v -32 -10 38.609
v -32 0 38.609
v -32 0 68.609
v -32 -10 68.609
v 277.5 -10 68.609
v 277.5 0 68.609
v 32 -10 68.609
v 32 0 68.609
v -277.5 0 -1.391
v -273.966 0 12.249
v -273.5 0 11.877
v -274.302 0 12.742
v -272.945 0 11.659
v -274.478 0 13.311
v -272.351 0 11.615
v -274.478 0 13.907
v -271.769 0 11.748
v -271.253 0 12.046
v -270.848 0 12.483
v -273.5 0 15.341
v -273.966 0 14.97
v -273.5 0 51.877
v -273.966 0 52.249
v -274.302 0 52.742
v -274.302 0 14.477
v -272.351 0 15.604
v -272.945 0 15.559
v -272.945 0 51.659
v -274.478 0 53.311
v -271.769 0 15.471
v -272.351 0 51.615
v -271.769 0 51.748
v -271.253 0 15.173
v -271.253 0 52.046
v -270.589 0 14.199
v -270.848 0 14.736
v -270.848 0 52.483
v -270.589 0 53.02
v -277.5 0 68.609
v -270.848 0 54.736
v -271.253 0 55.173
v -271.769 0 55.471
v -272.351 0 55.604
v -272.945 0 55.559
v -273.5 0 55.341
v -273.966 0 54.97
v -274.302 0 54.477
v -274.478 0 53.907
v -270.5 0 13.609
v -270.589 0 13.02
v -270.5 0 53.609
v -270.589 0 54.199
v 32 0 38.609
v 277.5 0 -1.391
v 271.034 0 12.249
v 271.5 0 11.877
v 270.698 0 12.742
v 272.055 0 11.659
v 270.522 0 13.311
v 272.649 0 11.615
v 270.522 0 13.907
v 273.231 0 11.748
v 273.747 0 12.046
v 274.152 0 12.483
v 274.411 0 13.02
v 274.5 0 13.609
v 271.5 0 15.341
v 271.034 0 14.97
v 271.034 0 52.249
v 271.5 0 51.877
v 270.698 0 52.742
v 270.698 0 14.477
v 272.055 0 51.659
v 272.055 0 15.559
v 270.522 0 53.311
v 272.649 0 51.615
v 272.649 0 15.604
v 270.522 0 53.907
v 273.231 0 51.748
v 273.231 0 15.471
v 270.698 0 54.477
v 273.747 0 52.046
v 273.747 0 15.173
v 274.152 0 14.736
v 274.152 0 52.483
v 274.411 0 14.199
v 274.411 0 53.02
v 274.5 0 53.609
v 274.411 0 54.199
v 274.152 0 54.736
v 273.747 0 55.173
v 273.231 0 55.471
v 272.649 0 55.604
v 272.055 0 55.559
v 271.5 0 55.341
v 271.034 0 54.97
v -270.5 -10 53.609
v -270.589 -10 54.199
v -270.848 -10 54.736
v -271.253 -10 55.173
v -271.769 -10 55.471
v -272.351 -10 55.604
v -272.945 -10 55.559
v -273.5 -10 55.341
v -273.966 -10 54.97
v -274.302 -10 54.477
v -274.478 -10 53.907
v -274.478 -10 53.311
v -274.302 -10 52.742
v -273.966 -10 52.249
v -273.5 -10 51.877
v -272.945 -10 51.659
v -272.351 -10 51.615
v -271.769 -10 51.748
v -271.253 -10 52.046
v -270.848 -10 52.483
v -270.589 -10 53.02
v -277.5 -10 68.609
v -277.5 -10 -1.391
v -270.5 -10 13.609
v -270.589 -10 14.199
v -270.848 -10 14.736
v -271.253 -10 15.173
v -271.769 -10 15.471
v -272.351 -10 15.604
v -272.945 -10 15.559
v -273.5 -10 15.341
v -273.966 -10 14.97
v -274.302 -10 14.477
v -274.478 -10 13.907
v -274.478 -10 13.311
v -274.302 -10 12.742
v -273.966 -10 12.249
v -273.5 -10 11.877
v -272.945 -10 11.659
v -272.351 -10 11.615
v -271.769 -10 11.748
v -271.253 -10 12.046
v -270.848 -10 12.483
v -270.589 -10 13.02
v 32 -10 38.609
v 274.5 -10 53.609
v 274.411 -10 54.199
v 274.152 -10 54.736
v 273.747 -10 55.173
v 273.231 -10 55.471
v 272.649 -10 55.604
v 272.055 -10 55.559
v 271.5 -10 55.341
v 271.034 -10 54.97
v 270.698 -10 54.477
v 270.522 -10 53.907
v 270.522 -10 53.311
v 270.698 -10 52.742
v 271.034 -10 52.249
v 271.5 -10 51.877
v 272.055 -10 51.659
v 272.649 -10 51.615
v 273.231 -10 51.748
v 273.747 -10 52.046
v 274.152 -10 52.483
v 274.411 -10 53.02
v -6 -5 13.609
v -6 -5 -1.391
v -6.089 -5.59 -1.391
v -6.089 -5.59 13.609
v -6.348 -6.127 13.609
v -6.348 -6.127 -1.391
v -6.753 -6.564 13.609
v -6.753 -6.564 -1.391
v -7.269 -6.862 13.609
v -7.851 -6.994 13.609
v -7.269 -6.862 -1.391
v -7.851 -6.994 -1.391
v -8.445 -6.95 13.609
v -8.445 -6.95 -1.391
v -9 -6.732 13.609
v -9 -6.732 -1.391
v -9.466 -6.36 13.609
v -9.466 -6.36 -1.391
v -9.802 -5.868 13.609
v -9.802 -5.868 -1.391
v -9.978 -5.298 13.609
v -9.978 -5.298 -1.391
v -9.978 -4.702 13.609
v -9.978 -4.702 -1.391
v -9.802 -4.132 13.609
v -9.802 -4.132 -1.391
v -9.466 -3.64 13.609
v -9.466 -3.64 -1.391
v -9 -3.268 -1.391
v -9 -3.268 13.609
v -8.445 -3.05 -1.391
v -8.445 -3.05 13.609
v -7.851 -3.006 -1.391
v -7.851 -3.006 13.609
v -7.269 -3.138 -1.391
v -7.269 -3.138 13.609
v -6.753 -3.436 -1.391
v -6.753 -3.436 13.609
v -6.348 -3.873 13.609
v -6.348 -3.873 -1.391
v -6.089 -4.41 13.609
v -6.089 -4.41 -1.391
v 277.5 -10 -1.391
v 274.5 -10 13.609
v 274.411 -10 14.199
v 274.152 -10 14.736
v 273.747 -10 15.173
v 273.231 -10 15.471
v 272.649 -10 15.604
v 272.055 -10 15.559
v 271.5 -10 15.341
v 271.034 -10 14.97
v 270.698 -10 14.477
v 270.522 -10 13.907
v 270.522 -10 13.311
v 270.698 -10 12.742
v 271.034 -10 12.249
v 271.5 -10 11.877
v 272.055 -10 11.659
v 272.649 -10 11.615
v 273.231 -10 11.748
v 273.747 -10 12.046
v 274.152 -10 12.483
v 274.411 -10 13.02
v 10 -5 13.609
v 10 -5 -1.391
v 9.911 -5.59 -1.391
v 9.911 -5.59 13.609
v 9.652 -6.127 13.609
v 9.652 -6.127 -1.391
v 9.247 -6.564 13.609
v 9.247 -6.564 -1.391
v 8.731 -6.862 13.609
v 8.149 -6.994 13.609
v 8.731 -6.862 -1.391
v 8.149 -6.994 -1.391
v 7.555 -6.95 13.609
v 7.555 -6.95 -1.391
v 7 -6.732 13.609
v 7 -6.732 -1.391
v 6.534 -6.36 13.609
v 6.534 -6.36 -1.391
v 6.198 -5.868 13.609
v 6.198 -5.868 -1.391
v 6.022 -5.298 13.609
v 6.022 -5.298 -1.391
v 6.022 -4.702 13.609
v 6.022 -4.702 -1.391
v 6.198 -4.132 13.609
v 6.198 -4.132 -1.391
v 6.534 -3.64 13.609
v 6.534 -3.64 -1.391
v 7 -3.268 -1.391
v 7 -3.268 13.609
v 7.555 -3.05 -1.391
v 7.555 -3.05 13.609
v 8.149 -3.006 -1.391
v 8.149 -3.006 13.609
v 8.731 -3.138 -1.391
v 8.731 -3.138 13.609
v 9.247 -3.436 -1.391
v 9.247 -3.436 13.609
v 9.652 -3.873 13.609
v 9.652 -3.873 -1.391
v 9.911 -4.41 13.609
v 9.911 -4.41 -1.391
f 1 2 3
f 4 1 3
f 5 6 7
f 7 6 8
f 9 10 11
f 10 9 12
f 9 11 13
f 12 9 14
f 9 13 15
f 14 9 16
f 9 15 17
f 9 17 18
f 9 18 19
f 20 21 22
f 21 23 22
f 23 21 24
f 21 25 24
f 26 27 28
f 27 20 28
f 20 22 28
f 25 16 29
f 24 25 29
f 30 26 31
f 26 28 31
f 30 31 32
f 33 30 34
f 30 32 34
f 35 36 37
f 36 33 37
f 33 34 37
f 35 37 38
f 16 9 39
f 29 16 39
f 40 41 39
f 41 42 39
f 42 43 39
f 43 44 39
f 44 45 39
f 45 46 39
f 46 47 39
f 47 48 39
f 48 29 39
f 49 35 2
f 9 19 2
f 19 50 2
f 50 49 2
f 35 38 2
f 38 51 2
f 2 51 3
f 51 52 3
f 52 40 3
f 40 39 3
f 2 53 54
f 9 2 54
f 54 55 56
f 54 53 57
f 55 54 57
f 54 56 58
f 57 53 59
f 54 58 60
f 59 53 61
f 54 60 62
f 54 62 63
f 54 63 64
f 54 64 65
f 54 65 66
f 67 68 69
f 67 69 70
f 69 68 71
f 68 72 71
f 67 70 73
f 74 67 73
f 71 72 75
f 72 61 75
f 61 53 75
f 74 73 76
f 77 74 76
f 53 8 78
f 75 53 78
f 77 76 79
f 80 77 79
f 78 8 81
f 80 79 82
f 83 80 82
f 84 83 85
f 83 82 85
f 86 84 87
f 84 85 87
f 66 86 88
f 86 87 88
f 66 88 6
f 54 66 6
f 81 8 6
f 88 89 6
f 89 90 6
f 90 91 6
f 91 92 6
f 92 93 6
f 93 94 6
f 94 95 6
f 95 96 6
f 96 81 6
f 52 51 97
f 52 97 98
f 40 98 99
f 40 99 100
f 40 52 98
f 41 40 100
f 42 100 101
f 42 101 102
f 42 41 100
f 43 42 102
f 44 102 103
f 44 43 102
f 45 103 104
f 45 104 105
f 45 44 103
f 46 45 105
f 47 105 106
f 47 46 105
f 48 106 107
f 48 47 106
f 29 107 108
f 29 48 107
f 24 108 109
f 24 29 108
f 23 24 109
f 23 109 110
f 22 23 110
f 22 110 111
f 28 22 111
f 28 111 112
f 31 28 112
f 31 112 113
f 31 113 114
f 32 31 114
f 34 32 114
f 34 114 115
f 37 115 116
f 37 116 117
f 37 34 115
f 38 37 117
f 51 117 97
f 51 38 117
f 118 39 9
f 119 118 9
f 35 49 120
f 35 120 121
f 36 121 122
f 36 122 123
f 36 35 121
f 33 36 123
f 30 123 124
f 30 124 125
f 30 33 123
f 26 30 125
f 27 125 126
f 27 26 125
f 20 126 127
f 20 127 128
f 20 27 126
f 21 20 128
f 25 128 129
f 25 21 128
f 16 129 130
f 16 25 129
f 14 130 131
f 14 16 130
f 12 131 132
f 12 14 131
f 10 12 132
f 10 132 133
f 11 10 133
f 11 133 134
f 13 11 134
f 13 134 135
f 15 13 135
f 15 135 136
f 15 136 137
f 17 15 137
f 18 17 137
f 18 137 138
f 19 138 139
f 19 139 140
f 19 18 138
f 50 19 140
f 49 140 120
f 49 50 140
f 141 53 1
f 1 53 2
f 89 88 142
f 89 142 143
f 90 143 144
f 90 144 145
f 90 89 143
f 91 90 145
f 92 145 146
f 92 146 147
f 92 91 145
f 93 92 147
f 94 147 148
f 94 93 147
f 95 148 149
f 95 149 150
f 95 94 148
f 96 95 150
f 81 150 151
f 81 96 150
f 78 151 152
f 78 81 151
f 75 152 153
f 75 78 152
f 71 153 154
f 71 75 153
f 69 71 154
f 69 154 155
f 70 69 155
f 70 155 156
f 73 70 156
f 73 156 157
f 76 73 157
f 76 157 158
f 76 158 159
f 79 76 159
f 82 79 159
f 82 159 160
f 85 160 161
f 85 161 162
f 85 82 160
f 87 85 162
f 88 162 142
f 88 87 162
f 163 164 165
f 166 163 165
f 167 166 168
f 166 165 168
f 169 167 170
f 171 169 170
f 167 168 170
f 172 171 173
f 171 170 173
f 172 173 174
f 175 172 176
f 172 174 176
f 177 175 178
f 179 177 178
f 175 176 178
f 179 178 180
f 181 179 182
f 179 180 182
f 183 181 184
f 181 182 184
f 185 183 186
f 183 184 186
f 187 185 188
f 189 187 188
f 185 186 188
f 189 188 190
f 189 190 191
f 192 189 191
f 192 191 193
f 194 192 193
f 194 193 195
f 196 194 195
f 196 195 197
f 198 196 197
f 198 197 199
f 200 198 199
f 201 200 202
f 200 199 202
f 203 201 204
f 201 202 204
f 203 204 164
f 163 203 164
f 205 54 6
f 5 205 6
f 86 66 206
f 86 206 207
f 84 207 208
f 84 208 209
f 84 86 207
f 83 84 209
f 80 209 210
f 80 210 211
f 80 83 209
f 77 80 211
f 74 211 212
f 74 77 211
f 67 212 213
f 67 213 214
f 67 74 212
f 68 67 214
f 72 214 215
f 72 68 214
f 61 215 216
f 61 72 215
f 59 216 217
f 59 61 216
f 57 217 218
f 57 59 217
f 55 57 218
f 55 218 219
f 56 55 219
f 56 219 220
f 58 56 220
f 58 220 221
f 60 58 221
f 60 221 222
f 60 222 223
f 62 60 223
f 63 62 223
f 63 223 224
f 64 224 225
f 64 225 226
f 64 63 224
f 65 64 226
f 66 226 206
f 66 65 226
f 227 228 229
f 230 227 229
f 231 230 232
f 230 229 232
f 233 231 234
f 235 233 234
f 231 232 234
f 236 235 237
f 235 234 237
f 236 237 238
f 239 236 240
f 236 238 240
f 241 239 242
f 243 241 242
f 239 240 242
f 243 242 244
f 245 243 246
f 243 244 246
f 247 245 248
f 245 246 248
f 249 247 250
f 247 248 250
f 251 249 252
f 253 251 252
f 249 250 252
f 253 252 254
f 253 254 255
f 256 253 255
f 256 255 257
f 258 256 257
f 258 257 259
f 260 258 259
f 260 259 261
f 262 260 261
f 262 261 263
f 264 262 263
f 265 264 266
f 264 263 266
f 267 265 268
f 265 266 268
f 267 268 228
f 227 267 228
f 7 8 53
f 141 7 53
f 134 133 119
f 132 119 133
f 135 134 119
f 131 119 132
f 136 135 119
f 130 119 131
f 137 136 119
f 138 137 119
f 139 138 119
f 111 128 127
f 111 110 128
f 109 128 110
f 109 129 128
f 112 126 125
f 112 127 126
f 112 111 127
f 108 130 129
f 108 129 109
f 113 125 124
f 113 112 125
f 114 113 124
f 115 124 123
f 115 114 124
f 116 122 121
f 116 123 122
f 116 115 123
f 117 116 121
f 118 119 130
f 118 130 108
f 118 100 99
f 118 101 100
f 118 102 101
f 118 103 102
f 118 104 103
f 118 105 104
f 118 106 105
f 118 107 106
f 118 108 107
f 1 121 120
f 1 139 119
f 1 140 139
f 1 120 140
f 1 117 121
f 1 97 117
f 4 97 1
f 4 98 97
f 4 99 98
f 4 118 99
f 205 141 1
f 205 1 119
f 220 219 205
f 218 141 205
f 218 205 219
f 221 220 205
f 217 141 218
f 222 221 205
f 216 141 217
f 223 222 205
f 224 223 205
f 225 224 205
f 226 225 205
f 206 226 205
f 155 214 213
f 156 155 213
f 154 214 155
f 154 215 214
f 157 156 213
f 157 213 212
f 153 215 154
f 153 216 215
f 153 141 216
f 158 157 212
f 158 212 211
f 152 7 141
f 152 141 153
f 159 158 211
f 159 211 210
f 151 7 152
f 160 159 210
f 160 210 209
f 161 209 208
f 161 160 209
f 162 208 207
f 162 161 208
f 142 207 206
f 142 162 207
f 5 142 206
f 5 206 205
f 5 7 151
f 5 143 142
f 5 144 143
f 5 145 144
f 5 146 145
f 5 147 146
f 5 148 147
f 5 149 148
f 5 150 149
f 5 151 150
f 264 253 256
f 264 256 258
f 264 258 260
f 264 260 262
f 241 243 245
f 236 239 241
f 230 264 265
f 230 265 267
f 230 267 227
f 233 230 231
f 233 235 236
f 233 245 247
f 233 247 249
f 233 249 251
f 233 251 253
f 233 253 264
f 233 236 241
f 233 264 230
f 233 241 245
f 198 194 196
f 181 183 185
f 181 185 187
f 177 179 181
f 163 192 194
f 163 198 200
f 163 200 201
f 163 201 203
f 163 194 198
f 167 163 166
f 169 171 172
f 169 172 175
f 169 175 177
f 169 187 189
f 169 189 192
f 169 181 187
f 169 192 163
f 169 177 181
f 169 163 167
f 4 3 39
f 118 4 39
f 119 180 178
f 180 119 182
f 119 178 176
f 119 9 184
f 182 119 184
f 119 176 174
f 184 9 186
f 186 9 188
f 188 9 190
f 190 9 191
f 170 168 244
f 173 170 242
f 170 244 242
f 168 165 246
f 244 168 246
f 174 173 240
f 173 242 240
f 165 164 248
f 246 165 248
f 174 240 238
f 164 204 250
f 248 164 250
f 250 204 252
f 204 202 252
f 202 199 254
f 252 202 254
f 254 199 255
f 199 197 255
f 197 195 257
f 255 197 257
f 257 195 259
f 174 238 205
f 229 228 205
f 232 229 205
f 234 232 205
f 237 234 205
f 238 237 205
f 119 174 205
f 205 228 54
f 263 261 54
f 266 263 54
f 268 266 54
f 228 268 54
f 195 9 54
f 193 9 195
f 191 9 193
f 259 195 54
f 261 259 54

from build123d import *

# Parameters (mm, degrees)
F0_R     = 2
F1_DEPTH = 10
F2_R     = 2
F3_DEPTH = 15


with BuildPart() as f1:
    # F0 (on Front) → F1 (new body)
    with BuildSketch(Plane.XZ):
        Polygon((-32, 68.609319), (-277.5, 68.609319), (-277.5, -1.390681), (277.5, -1.390681), (277.5, 68.609319), (32, 68.609319), (32, 38.609319), (0, 38.609319), (-32, 38.609319), align=None)
        with Locations((-272.5, 13.609319)):
            Circle(F0_R, mode=Mode.SUBTRACT)
        with Locations((272.5, 13.609319)):
            Circle(F0_R, mode=Mode.SUBTRACT)
        with Locations((-272.5, 53.609319)):
            Circle(F0_R, mode=Mode.SUBTRACT)
        with Locations((272.5, 53.609319)):
            Circle(F0_R, mode=Mode.SUBTRACT)
    extrude(amount=F1_DEPTH)

    # F2 (on face) → F3 (cut)
    with BuildSketch(Plane(origin=(0, 0, -1.390681), x_dir=(1, 0, 0), z_dir=(0, 0, -1))):
        with Locations((-8, 5)):
            Circle(F2_R)
        with Locations((8, 5)):
            Circle(F2_R)
    extrude(amount=-F3_DEPTH, mode=Mode.SUBTRACT)


solid = f1.part
